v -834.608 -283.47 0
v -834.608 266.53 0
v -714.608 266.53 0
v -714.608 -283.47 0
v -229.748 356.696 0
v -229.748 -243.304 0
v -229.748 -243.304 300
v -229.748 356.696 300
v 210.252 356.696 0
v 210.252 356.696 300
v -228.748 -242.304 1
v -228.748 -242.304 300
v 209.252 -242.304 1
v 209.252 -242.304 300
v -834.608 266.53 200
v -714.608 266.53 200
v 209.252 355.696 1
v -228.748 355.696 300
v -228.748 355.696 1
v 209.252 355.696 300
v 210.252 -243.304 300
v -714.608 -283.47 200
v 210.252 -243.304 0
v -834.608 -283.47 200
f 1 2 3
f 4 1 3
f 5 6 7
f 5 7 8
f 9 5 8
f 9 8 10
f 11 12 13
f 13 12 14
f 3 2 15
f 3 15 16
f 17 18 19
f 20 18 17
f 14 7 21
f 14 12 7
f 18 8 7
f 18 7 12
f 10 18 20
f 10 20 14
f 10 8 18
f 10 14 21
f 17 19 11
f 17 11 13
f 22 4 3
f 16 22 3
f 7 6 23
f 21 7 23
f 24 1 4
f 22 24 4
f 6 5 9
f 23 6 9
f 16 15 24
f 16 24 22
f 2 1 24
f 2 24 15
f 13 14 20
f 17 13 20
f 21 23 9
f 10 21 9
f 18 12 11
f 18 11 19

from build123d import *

# Parameters (mm, degrees)
F0_W     = 440
F0_H     = 600
F1_DEPTH = 300
F2_W     = 438
F2_H     = 598
F3_DEPTH = 299
F4_W     = 120
F4_H     = 550
F5_DEPTH = 200


with BuildPart() as f1:
    # F0 (on Top) → F1 (new body)
    with BuildSketch(Plane.XY):
        with Locations((-9.748274, 56.695815)):
            Rectangle(F0_W, F0_H)
    extrude(amount=F1_DEPTH)

    # F2 (on face) → F3 (cut)
    with BuildSketch(Plane.XY.offset(300)):
        with Locations((-9.748274, 56.695815)):
            Rectangle(F2_W, F2_H)
    extrude(amount=-F3_DEPTH, mode=Mode.SUBTRACT)


with BuildPart() as f5:
    # F4 (on Top) → F5 (new body)
    with BuildSketch(Plane.XY):
        with Locations((-774.607886, -8.470178)):
            Rectangle(F4_W, F4_H)
    extrude(amount=F5_DEPTH)


solid = Compound([f1.part, f5.part])
